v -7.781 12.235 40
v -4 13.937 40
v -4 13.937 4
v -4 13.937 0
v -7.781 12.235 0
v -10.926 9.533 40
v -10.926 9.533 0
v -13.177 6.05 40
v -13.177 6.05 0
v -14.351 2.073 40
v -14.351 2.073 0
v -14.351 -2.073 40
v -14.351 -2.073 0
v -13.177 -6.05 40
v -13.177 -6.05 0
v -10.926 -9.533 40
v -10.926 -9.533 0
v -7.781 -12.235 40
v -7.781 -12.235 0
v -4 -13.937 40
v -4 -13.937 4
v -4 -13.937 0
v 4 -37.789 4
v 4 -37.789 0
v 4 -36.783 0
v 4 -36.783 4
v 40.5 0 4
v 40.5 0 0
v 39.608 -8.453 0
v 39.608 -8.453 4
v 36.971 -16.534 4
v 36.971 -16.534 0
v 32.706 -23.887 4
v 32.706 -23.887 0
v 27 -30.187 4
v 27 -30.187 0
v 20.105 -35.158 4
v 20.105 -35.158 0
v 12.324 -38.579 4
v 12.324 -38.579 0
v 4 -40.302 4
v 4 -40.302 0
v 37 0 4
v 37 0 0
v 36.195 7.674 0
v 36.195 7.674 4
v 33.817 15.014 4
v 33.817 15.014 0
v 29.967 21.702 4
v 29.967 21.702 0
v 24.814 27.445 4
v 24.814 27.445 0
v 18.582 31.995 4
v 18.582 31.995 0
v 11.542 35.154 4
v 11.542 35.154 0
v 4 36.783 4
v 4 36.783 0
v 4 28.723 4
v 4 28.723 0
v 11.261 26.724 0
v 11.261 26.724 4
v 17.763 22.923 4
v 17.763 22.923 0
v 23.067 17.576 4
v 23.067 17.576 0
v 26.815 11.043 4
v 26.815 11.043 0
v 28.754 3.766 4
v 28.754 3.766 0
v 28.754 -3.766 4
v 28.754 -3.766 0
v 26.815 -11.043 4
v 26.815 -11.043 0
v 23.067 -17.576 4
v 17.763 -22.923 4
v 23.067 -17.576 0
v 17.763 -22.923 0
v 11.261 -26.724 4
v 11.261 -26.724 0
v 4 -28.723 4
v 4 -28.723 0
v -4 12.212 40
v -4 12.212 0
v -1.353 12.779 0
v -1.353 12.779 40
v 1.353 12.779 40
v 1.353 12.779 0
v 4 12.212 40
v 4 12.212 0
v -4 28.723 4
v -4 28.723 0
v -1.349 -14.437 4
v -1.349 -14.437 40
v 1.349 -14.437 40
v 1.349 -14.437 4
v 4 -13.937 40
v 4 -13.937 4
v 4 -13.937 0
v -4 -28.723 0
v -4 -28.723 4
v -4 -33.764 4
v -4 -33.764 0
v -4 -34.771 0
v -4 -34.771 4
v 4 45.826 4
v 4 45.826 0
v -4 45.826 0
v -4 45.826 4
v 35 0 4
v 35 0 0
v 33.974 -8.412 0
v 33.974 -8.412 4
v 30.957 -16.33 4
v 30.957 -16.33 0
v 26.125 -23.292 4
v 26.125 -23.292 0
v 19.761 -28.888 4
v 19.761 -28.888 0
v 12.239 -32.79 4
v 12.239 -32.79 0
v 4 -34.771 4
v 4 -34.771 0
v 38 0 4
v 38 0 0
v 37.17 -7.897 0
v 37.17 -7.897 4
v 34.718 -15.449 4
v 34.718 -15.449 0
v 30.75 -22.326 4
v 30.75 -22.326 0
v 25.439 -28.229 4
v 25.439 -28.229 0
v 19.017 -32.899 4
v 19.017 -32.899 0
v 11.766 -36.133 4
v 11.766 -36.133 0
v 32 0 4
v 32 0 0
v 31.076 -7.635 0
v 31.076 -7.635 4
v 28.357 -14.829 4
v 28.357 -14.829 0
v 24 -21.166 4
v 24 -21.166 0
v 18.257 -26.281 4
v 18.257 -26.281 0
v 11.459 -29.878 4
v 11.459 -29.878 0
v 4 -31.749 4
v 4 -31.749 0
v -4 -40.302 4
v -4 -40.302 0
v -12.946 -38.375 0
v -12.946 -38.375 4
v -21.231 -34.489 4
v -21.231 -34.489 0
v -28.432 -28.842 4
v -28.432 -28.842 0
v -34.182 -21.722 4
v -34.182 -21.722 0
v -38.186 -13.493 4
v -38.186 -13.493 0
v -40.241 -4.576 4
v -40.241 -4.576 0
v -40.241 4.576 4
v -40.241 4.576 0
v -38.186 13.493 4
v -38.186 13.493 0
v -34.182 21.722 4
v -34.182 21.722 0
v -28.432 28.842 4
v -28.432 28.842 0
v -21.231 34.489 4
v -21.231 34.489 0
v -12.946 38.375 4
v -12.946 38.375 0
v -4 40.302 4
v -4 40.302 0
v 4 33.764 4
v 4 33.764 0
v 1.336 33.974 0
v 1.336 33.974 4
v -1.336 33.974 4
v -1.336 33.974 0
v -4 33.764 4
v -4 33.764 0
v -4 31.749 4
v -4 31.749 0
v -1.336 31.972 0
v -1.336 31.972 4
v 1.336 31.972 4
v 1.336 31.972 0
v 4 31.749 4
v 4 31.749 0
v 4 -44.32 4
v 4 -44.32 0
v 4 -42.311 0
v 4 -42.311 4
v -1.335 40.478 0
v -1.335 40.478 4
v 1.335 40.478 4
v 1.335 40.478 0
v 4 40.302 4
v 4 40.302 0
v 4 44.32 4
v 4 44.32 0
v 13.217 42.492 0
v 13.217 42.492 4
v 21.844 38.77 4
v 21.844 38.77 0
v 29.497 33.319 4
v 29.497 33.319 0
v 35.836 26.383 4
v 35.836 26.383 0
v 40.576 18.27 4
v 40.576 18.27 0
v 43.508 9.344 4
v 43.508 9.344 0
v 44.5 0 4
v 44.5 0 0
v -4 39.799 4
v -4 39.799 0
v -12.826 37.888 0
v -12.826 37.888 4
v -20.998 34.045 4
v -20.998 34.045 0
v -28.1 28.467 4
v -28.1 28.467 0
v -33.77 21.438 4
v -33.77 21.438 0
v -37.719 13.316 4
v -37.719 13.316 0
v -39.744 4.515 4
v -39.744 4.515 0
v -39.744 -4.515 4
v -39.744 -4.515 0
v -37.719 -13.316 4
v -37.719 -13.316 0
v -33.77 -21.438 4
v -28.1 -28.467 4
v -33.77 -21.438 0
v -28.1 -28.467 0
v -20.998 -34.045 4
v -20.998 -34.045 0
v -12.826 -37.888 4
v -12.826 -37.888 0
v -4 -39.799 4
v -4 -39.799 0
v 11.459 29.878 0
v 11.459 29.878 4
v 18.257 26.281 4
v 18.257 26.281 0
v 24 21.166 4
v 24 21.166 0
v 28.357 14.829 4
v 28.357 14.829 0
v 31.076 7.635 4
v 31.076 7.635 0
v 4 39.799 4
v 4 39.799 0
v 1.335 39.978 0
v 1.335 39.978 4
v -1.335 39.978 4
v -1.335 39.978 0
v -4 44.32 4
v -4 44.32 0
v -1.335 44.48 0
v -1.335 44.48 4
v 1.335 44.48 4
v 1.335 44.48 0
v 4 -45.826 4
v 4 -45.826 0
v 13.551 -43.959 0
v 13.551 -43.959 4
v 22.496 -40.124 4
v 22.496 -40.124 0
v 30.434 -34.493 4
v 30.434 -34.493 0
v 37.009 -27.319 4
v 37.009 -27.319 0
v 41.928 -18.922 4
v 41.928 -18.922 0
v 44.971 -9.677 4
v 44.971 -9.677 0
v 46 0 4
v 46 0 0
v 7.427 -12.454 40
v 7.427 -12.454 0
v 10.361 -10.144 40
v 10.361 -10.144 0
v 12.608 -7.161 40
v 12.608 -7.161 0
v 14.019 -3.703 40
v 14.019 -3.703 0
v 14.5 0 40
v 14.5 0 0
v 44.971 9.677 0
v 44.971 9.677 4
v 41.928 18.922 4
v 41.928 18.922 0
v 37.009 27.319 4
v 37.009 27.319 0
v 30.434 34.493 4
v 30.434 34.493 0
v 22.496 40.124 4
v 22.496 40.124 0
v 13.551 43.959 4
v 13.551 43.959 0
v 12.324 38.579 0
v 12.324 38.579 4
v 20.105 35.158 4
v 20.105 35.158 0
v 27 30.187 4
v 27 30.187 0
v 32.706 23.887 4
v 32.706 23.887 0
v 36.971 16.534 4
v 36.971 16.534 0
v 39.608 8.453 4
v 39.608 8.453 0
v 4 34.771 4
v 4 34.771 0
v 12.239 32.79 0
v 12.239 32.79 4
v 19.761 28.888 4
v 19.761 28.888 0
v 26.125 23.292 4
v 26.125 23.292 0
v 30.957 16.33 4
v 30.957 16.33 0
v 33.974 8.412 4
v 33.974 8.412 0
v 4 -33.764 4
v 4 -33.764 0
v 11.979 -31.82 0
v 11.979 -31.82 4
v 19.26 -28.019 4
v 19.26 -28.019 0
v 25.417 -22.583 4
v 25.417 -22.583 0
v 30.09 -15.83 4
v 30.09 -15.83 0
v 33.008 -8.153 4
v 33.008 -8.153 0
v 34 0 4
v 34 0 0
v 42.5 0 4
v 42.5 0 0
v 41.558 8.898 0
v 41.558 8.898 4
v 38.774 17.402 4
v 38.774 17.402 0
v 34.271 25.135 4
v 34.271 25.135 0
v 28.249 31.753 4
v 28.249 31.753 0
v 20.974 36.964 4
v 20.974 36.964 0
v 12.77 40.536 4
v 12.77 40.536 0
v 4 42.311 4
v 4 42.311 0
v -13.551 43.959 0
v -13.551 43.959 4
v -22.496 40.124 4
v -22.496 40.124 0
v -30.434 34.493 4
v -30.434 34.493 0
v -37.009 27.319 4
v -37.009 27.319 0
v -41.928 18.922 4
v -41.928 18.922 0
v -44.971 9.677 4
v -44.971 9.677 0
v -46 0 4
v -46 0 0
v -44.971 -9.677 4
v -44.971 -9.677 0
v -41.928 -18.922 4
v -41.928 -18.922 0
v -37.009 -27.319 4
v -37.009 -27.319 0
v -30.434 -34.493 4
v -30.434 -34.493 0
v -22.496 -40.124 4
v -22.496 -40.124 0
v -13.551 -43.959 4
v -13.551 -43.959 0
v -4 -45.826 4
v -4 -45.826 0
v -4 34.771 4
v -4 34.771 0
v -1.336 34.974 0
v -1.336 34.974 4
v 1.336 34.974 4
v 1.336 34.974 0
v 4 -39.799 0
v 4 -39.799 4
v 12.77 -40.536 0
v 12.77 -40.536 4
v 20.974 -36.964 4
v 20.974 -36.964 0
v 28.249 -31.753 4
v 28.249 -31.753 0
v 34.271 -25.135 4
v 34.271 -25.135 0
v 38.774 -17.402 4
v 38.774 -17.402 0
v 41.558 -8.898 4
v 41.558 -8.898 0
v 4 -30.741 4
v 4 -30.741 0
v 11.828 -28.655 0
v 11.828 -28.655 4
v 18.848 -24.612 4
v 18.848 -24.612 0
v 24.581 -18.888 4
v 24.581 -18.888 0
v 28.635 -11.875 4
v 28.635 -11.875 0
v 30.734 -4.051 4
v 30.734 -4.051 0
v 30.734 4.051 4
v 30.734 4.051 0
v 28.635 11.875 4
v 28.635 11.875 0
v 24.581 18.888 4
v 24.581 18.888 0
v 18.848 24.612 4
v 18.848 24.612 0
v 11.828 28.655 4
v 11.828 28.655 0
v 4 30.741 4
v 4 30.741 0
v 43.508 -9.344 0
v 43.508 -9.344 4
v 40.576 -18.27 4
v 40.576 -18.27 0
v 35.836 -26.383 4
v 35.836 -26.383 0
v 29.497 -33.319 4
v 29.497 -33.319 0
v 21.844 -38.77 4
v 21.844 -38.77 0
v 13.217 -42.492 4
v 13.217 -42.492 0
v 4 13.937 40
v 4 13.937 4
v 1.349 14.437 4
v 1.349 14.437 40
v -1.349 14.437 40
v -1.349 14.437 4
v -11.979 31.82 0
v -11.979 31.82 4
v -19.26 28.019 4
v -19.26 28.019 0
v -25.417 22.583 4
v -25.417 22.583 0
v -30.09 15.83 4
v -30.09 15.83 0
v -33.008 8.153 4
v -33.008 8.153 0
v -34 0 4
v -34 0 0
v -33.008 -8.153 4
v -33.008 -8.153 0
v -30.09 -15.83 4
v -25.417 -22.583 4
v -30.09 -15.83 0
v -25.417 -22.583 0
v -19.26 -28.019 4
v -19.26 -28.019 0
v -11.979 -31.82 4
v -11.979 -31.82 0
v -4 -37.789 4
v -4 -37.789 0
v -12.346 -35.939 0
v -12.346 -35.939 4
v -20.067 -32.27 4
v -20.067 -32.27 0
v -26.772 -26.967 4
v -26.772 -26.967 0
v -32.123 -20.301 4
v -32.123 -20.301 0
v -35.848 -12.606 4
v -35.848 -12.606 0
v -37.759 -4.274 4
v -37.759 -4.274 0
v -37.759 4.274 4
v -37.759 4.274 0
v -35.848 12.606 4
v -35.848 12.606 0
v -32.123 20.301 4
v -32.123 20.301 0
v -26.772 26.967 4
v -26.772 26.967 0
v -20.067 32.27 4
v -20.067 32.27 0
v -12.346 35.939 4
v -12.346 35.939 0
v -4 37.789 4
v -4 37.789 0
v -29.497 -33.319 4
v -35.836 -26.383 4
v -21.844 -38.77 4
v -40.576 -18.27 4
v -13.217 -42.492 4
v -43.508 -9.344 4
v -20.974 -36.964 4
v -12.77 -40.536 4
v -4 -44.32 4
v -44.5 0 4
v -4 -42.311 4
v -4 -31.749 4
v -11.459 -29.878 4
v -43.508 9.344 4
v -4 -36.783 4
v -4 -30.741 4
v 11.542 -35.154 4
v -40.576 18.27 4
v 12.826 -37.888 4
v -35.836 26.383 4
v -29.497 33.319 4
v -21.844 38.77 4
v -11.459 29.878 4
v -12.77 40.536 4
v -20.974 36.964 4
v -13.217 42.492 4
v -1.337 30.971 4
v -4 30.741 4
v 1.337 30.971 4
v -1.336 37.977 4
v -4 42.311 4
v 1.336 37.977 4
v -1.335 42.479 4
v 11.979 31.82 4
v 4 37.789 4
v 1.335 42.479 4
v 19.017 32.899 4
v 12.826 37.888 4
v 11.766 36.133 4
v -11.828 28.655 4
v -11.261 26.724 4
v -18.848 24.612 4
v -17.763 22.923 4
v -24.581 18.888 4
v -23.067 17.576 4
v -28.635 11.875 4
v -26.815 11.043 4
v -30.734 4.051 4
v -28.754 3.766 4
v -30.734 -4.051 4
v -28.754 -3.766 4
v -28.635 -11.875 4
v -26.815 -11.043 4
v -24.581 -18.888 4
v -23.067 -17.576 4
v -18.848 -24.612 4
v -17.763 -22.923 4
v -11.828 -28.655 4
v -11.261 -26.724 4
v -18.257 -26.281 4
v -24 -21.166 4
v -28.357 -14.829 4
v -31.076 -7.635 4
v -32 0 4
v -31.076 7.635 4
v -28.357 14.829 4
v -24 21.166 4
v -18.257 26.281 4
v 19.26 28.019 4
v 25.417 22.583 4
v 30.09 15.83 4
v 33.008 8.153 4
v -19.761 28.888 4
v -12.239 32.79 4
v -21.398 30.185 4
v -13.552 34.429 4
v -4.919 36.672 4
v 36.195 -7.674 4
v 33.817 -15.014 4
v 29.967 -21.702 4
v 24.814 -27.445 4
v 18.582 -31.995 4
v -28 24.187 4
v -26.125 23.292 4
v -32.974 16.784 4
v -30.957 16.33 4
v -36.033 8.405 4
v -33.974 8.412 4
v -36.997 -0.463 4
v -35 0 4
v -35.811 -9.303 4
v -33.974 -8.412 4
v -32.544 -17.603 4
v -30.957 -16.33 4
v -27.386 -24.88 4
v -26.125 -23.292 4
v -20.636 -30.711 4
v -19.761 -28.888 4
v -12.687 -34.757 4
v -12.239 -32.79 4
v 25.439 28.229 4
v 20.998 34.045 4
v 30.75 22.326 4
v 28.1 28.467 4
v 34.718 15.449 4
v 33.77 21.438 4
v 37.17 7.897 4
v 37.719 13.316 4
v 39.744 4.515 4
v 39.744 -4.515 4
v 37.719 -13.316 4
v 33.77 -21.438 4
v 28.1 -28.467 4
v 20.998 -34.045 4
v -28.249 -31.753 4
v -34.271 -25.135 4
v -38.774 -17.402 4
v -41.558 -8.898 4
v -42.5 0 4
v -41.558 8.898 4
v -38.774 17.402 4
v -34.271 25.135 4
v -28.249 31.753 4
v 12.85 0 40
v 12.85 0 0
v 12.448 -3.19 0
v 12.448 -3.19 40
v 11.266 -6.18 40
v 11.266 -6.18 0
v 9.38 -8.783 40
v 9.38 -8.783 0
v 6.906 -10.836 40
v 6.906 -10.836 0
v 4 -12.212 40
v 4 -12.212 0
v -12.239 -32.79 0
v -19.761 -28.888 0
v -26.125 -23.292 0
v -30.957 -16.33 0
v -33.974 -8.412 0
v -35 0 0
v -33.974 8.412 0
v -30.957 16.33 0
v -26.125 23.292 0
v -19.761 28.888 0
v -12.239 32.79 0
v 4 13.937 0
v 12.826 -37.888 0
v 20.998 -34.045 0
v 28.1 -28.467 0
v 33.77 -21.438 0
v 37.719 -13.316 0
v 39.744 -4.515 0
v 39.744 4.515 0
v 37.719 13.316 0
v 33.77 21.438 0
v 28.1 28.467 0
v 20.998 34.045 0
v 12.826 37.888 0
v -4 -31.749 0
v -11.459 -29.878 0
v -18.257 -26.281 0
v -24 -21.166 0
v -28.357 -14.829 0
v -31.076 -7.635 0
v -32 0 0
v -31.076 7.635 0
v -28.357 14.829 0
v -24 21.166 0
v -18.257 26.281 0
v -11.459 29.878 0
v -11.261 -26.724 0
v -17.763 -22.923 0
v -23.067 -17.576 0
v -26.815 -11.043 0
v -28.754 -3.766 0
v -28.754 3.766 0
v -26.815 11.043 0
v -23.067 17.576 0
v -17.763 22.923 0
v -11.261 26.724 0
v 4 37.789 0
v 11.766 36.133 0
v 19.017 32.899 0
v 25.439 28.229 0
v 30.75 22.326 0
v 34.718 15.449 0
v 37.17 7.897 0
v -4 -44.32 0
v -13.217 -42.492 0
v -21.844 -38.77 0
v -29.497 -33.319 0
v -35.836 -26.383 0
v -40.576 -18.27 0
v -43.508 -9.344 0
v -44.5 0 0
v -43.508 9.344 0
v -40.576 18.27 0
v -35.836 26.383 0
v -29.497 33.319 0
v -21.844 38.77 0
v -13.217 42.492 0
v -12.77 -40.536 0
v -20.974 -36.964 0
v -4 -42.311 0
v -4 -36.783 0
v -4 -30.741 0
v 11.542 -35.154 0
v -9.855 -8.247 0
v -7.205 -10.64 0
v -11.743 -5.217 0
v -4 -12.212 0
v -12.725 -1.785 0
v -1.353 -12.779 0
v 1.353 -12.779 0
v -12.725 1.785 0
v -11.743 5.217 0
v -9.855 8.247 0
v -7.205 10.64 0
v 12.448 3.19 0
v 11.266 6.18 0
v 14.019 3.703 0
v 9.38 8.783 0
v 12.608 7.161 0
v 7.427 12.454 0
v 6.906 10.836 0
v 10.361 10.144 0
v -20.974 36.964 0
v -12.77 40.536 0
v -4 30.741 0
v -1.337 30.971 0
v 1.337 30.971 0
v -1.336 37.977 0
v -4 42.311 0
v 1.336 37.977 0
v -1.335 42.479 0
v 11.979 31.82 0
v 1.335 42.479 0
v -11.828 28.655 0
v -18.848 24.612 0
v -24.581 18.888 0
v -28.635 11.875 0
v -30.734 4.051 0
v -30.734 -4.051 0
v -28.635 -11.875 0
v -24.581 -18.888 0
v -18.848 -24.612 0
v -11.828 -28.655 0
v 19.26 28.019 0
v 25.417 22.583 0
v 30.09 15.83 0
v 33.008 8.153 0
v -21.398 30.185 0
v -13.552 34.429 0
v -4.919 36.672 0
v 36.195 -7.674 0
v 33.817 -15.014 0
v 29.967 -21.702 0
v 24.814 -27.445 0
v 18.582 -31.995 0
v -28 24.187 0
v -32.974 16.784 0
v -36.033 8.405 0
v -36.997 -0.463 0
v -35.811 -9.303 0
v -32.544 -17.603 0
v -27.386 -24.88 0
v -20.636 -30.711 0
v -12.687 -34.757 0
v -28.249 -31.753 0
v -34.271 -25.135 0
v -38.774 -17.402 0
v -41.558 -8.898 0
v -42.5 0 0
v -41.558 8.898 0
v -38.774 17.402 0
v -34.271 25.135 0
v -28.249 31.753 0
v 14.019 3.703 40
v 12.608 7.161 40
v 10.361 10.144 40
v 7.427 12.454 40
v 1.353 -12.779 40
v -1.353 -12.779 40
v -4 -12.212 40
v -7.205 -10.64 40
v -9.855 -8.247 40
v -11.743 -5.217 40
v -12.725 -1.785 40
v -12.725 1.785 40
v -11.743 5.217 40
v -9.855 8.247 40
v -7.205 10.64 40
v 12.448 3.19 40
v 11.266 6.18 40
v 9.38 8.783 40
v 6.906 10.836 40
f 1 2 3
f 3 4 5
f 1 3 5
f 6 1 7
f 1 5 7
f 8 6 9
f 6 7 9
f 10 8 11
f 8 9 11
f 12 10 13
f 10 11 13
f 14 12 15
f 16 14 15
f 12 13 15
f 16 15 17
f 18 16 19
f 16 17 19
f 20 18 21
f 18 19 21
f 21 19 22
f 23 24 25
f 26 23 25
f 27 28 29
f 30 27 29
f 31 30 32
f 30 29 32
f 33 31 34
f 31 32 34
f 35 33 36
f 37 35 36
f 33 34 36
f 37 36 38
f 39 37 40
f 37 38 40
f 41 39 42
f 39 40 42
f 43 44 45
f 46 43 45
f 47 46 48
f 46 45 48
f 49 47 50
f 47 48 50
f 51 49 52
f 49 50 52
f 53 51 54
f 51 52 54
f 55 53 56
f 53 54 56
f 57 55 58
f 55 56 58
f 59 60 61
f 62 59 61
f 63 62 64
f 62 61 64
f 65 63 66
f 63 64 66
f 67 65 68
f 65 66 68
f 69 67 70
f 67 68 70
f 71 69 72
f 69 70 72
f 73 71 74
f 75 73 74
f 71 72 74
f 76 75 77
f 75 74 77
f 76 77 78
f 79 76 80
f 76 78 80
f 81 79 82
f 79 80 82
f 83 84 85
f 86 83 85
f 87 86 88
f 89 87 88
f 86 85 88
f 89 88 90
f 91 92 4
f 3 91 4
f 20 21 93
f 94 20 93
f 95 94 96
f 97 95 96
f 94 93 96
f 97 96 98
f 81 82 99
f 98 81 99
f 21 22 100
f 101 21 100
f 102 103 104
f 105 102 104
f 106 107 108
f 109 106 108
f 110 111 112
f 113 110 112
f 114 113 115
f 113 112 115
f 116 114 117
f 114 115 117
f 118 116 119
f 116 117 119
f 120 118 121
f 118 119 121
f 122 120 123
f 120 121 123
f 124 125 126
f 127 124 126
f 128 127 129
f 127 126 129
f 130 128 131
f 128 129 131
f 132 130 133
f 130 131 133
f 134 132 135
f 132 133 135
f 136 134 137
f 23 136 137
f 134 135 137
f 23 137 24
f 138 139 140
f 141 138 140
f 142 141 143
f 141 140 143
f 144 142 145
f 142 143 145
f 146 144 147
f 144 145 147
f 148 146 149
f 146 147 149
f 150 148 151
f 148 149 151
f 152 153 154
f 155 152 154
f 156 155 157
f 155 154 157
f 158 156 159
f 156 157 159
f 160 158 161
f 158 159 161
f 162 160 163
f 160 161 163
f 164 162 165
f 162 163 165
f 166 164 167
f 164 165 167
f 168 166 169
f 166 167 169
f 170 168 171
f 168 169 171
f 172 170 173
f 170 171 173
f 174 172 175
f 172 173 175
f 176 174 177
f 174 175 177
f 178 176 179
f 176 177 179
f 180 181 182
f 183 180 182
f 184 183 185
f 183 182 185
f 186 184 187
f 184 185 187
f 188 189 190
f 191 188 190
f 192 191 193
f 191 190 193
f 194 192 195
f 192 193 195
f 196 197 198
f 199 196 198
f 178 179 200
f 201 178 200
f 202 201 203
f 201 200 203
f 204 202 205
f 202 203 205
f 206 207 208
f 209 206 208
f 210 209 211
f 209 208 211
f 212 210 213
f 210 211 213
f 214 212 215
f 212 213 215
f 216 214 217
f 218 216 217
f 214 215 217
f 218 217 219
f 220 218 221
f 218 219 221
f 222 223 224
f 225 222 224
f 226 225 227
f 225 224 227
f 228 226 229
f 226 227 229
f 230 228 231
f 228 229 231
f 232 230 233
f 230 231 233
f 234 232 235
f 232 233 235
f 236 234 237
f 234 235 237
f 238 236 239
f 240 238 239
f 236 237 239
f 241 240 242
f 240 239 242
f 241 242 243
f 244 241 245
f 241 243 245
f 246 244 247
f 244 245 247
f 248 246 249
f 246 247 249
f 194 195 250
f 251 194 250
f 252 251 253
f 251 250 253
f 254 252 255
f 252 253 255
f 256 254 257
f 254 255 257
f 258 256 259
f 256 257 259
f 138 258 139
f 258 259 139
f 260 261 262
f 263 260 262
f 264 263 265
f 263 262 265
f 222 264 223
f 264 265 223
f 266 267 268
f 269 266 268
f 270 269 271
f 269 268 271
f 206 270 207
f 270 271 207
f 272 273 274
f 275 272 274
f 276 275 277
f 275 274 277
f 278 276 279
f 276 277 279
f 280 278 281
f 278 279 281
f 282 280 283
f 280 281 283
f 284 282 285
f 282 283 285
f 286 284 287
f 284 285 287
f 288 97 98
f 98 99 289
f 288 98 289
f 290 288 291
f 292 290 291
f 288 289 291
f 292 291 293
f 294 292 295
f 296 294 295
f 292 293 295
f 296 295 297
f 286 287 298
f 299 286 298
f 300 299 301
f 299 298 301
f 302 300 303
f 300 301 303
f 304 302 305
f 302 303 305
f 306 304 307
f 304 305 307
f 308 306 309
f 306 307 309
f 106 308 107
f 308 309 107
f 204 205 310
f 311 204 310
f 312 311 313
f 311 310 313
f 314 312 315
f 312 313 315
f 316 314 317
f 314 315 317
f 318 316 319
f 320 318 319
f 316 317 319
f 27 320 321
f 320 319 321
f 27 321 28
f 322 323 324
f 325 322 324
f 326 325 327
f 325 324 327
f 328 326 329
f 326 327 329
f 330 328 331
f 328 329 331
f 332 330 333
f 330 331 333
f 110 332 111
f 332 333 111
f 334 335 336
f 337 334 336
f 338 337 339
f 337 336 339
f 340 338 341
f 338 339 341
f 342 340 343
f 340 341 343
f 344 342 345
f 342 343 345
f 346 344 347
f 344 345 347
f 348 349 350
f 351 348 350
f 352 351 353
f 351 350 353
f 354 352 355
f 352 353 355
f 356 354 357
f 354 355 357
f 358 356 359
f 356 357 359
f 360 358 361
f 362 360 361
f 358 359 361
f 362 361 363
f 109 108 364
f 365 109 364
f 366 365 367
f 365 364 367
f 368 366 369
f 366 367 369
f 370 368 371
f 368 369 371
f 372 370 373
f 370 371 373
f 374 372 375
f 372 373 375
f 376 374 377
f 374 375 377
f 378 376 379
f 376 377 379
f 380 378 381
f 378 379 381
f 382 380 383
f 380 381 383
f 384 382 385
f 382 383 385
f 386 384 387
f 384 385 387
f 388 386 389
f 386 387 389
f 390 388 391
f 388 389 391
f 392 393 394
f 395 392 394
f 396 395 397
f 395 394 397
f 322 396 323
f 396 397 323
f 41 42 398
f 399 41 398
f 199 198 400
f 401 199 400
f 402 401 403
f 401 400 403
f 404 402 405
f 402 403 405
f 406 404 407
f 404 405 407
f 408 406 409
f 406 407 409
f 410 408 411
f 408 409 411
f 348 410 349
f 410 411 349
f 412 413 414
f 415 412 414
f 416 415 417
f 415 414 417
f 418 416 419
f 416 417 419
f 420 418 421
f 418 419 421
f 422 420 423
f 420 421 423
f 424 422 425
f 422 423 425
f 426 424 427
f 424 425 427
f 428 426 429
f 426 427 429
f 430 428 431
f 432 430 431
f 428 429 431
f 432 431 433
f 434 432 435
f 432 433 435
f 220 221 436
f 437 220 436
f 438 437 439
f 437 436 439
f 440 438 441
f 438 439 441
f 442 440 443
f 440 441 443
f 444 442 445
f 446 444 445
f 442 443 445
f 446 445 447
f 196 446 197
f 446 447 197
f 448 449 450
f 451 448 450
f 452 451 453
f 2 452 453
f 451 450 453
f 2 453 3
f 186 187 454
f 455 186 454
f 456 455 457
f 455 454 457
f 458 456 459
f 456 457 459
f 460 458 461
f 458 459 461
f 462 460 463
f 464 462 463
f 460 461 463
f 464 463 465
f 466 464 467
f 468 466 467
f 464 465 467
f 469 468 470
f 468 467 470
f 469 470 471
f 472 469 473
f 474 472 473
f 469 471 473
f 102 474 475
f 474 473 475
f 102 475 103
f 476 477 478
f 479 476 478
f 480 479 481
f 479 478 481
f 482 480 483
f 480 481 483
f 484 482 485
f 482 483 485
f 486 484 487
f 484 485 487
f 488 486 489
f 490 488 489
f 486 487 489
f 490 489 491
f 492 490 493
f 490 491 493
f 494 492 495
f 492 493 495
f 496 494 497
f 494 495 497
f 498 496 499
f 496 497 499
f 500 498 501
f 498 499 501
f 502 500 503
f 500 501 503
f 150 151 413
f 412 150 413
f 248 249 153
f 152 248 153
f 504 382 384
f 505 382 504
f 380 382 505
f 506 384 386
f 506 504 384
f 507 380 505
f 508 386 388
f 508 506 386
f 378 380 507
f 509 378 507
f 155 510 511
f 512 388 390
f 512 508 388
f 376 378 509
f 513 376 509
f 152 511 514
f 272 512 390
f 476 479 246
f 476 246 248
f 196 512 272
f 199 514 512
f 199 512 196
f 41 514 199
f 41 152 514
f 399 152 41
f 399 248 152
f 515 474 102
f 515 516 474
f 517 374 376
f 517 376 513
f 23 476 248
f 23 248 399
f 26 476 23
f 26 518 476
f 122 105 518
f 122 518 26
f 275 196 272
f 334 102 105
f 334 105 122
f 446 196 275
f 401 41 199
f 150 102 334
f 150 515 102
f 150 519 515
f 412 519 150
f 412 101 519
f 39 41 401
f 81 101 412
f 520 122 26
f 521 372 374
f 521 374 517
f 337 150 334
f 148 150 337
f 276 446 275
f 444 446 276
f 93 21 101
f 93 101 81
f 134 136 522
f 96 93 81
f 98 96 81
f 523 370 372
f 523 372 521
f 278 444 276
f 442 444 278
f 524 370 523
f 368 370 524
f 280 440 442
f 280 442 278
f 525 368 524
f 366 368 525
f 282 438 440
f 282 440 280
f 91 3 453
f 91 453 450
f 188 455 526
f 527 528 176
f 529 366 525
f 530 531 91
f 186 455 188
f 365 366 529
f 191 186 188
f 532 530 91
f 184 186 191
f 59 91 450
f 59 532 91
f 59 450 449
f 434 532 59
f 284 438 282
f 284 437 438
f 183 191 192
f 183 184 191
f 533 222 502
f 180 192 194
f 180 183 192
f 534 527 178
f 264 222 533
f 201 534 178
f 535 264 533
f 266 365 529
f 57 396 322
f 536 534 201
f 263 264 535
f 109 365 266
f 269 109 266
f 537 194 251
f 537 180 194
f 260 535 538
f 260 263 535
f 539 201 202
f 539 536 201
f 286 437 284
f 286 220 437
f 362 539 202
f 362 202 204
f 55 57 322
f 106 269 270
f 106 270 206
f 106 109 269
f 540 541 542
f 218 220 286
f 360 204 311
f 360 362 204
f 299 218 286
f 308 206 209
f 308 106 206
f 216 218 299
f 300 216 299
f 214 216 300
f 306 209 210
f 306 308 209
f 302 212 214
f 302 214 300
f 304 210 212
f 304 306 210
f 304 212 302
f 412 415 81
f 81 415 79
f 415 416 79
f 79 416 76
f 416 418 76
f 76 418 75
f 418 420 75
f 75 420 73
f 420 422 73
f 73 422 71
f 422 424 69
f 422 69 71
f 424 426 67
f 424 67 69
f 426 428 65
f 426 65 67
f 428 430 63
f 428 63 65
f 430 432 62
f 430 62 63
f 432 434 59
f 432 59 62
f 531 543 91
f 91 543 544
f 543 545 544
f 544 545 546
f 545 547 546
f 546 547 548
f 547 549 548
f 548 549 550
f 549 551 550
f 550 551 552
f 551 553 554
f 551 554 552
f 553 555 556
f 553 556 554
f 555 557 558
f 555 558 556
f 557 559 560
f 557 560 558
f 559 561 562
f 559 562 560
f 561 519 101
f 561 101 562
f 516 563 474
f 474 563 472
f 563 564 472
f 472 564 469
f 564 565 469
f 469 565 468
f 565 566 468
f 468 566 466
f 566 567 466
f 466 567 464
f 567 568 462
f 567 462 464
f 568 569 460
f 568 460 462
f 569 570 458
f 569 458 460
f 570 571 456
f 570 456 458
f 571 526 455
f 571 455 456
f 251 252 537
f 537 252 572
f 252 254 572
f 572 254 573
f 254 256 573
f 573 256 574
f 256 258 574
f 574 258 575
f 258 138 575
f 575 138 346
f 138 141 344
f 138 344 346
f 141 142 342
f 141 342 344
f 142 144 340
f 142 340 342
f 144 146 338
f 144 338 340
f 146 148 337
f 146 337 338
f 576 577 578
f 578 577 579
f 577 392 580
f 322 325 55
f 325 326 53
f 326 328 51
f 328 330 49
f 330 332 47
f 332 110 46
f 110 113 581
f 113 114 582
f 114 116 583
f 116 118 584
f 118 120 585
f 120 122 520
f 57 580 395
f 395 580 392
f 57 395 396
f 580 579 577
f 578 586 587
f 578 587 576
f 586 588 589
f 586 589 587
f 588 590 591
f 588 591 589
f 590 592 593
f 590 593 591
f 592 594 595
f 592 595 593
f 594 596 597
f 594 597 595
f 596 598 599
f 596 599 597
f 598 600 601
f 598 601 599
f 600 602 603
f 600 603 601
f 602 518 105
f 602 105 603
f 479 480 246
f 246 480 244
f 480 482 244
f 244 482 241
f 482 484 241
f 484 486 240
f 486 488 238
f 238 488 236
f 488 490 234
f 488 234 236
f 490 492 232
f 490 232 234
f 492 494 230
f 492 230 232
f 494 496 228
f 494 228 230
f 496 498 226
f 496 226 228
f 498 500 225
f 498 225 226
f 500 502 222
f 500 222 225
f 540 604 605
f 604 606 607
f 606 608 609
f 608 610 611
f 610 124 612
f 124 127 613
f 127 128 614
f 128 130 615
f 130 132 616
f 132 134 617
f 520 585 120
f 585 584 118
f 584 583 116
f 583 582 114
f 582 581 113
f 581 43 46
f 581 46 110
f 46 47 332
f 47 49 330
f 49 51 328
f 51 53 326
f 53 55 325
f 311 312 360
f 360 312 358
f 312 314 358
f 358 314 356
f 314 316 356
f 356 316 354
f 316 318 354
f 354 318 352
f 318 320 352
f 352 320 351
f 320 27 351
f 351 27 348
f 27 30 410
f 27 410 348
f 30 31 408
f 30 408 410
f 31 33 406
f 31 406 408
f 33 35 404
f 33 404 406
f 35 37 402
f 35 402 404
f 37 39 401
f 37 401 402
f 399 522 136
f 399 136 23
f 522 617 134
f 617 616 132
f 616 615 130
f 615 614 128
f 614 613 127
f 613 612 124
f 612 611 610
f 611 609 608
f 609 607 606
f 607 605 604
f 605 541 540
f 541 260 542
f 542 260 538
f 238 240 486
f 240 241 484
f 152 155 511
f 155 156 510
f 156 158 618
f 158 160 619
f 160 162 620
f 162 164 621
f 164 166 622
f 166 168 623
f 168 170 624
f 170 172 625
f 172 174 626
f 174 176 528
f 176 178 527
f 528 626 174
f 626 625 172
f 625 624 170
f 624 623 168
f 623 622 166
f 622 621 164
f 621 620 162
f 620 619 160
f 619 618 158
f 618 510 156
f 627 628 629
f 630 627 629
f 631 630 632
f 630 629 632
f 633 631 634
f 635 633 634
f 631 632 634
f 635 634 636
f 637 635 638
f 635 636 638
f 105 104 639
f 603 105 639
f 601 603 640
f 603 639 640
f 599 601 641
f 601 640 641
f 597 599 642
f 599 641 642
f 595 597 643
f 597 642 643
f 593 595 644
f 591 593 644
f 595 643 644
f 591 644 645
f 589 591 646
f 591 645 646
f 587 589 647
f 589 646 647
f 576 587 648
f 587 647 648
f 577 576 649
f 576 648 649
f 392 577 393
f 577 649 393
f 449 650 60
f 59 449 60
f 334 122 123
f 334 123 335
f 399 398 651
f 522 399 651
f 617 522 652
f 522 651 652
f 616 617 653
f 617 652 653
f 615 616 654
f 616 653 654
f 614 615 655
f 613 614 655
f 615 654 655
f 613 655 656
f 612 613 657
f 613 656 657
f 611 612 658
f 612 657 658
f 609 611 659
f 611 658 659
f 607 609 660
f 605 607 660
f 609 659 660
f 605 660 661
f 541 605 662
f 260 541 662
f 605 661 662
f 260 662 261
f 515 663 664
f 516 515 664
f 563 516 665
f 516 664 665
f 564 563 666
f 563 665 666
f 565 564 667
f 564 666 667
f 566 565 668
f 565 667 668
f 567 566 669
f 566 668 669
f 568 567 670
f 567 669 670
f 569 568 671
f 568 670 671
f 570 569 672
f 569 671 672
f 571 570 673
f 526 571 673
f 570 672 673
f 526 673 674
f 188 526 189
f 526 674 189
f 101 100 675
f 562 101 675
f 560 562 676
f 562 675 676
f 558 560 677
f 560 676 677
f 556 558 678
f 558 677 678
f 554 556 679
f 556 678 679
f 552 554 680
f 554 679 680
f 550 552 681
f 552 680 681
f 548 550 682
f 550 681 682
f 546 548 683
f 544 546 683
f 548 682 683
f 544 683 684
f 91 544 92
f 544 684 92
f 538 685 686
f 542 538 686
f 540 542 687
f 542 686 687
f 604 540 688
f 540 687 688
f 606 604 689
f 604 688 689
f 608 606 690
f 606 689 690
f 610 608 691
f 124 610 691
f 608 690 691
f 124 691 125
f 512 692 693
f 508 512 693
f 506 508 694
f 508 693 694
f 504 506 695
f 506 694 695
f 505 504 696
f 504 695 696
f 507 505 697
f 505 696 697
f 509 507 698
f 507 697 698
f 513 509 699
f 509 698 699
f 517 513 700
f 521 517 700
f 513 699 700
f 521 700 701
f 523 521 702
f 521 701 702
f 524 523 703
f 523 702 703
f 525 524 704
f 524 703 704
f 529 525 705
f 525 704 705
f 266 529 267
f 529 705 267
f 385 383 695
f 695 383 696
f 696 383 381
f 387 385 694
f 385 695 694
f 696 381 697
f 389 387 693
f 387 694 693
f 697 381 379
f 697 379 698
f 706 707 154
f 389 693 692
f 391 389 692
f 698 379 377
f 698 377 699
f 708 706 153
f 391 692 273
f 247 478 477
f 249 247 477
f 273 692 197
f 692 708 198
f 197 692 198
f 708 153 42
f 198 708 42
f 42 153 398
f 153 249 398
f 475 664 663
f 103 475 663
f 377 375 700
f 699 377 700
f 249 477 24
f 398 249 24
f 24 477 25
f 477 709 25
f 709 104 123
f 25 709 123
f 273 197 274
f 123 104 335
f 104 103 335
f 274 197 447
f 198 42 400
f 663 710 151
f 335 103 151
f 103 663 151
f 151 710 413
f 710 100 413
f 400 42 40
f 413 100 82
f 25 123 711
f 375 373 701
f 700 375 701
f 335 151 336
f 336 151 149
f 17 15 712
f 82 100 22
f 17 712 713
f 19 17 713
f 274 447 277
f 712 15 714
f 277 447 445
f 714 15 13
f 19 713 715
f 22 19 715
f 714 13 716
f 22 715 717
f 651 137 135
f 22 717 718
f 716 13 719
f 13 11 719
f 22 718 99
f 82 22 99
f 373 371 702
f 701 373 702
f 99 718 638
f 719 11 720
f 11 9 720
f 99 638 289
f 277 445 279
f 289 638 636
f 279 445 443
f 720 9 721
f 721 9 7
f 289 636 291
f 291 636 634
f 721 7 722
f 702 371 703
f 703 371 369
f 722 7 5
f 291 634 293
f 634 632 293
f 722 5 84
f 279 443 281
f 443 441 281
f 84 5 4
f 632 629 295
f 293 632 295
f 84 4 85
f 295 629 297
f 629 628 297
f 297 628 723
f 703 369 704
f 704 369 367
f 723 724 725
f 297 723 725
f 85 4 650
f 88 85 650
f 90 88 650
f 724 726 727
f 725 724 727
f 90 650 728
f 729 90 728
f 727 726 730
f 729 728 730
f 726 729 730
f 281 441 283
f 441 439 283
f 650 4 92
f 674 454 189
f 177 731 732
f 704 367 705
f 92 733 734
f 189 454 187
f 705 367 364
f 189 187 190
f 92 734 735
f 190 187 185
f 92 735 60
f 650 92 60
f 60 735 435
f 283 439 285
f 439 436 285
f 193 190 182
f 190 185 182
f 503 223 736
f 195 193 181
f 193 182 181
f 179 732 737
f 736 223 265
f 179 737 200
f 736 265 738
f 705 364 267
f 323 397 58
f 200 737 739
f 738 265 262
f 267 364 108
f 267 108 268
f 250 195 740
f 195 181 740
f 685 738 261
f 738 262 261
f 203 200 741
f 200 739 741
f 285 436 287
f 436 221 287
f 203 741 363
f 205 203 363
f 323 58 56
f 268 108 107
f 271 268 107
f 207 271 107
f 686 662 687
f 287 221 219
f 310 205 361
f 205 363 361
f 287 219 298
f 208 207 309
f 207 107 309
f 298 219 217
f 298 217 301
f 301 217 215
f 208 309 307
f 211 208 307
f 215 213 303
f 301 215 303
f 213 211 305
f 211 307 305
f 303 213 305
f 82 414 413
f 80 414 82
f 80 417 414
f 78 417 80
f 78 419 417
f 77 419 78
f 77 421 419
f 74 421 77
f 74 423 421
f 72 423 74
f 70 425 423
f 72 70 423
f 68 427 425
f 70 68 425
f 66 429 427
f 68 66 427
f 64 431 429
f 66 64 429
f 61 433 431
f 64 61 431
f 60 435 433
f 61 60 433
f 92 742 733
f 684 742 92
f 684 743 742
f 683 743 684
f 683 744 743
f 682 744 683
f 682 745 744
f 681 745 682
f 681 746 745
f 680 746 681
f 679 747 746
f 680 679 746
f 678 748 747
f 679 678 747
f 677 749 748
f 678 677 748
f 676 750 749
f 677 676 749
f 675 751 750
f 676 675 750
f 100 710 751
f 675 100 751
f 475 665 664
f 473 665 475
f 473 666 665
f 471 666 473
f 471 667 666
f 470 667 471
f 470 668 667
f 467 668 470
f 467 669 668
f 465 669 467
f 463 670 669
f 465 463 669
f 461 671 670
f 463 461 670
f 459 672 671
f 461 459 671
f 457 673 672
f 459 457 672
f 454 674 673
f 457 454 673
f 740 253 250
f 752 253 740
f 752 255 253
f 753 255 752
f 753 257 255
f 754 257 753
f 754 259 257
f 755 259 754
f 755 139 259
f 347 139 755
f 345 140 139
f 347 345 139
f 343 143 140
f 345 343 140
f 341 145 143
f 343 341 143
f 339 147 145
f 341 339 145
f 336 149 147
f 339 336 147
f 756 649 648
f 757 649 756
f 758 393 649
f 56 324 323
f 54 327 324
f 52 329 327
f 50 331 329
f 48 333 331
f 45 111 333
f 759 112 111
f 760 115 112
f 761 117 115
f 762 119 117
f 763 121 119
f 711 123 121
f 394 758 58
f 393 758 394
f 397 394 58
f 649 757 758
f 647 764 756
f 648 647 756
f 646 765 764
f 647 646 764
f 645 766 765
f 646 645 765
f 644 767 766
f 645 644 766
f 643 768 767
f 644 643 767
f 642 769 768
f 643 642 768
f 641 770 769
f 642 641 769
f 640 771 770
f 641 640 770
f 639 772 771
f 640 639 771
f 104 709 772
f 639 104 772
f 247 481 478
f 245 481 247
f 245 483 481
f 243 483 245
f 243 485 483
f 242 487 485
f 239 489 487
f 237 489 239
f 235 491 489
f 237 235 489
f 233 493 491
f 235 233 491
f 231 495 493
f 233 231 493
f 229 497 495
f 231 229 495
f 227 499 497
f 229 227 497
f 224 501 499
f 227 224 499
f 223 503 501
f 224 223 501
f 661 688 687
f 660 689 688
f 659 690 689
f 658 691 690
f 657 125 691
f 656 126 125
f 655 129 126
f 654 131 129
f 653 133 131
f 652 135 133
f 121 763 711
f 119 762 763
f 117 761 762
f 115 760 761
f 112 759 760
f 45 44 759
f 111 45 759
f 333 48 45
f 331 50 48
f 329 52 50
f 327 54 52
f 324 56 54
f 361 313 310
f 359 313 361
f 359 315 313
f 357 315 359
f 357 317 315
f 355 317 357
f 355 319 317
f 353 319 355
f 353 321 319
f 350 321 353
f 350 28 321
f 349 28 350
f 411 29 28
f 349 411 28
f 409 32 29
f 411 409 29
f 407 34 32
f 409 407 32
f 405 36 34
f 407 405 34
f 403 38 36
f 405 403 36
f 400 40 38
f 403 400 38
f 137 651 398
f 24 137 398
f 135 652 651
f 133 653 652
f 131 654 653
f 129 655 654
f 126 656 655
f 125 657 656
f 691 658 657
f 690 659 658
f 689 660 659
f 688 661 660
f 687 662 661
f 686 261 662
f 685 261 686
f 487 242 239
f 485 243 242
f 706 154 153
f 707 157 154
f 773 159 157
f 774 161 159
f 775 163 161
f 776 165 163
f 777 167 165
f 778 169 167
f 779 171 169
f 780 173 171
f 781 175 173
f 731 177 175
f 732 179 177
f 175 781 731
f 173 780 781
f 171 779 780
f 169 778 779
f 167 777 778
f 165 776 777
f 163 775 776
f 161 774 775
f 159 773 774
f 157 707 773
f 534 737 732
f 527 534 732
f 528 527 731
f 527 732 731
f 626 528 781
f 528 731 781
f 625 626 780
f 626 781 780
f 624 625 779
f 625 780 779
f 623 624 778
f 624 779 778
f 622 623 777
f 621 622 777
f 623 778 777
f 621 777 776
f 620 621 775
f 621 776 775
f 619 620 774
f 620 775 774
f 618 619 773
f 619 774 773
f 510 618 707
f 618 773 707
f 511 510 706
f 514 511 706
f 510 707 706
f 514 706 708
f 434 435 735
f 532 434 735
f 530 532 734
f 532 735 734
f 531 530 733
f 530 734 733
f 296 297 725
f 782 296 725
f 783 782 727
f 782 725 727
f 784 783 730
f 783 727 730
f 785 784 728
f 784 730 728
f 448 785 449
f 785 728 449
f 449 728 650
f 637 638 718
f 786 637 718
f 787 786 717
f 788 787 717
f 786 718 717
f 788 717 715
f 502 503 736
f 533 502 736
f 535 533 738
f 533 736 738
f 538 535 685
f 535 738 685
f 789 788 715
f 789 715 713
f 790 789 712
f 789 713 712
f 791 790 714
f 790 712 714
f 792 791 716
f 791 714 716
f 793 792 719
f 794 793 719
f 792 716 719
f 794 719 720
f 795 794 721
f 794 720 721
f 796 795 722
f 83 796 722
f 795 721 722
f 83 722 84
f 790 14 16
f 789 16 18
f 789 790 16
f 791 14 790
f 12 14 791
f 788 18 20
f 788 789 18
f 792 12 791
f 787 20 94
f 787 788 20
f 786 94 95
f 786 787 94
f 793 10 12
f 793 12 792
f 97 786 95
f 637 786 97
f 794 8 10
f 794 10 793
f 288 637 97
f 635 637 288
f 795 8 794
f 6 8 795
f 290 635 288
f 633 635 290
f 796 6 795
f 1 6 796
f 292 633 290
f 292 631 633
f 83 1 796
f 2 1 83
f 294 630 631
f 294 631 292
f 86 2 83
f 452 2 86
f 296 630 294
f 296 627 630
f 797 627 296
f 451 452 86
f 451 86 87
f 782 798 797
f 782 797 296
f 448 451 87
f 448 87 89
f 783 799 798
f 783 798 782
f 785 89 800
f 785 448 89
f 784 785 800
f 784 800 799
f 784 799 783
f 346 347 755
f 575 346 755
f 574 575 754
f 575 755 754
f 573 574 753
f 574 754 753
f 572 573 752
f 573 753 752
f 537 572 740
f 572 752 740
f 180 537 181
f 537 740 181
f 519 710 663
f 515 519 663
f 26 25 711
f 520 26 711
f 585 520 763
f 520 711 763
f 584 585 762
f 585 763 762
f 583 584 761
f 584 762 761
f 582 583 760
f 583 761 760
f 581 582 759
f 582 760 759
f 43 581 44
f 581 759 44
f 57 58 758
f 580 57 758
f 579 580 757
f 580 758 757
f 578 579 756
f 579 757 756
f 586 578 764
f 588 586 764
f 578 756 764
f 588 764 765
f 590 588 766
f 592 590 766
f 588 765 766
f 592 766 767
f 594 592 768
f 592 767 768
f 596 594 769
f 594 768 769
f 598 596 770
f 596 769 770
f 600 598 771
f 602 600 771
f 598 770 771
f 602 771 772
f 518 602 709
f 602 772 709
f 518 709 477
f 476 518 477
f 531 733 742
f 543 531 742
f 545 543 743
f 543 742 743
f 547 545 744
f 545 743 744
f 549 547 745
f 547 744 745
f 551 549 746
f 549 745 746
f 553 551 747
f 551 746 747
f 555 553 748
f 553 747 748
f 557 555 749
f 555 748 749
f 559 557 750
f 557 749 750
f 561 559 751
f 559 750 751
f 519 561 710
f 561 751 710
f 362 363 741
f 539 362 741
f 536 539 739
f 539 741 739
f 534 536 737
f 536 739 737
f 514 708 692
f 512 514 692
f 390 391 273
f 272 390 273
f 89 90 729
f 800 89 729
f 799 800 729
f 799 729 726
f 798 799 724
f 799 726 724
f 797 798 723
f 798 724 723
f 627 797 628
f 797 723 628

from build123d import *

# Parameters (mm, degrees)
F1_DEPTH = 40
F2_DEPTH = 4


with BuildPart() as f1:
    # F0 (on Top) → F1 (new body)
    with BuildSketch(Plane.XY):
        with BuildLine():
            ThreePointArc((4, 12.2115723803), (10.4048666498, 7.5406398933), (12.85, 0))
            ThreePointArc((12.85, 0), (10.4048666498, -7.5406398933), (4, -12.2115723803))
            Line((4, -12.2115723803), (4, -13.9373598648))
            ThreePointArc((4, -13.9373598648), (11.5812348219, -8.7249641833), (14.5, 0))
            ThreePointArc((14.5, 0), (11.5812348219, 8.7249641833), (4, 13.9373598648))
            Line((4, 13.9373598648), (4, 12.2115723803))
        make_face()
        with BuildLine():
            ThreePointArc((-4, 12.2115723803), (0, 12.85), (4, 12.2115723803))
            Line((4, 12.2115723803), (4, 13.9373598648))
            ThreePointArc((4, 13.9373598648), (0, 14.5), (-4, 13.9373598648))
            Line((-4, 13.9373598648), (-4, 12.2115723803))
        make_face()
        with BuildLine():
            Line((4, -13.9373598648), (4, -12.2115723803))
            ThreePointArc((4, -12.2115723803), (0, -12.85), (-4, -12.2115723803))
            Line((-4, -12.2115723803), (-4, -13.9373598648))
            ThreePointArc((-4, -13.9373598648), (0, -14.5), (4, -13.9373598648))
        make_face()
        with BuildLine():
            ThreePointArc((-4, -12.2115723803), (-12.85, 0), (-4, 12.2115723803))
            Line((-4, 12.2115723803), (-4, 13.9373598648))
            ThreePointArc((-4, 13.9373598648), (-14.5, 0), (-4, -13.9373598648))
            Line((-4, -13.9373598648), (-4, -12.2115723803))
        make_face()
    extrude(amount=F1_DEPTH)

    # F0 (on Top) → F2 (join)
    with BuildSketch(Plane.XY):
        with BuildLine():
            Line((4, -28.7228132327), (4, -13.9373598648))
            ThreePointArc((4, -13.9373598648), (0, -14.5), (-4, -13.9373598648))
            Line((-4, -13.9373598648), (-4, -28.7228132327))
            ThreePointArc((-4, -28.7228132327), (0, -29), (4, -28.7228132327))
        make_face()
        with BuildLine():
            ThreePointArc((-4, 40.3019850628), (0, 40.5), (4, 40.3019850628))
            Line((4, 40.3019850628), (4, 42.3113459961))
            ThreePointArc((4, 42.3113459961), (0, 42.5), (-4, 42.3113459961))
            Line((-4, 42.3113459961), (-4, 40.3019850628))
        make_face()
        with BuildLine():
            ThreePointArc((-4, -40.3019850628), (-40.5, 0), (-4, 40.3019850628))
            Line((-4, 40.3019850628), (-4, 42.3113459961))
            ThreePointArc((-4, 42.3113459961), (-42.5, 0), (-4, -42.3113459961))
            Line((-4, -42.3113459961), (-4, -40.3019850628))
        make_face()
        with BuildLine():
            Line((4, -42.3113459961), (4, -40.3019850628))
            ThreePointArc((4, -40.3019850628), (0, -40.5), (-4, -40.3019850628))
            Line((-4, -40.3019850628), (-4, -42.3113459961))
            ThreePointArc((-4, -42.3113459961), (0, -42.5), (4, -42.3113459961))
        make_face()
        with BuildLine():
            Line((4, 42.3113459961), (4, 40.3019850628))
            ThreePointArc((4, 40.3019850628), (30.0187441443, 27.1868534406), (40.5, 0))
            ThreePointArc((40.5, 0), (30.0187441443, -27.1868534406), (4, -40.3019850628))
            Line((4, -40.3019850628), (4, -42.3113459961))
            ThreePointArc((4, -42.3113459961), (31.434455618, -28.6028844699), (42.5, 0))
            ThreePointArc((42.5, 0), (31.434455618, 28.6028844699), (4, 42.3113459961))
        make_face()
        with BuildLine():
            ThreePointArc((-4, 37.7888872554), (0, 38), (4, 37.7888872554))
            Line((4, 37.7888872554), (4, 39.7994974843))
            ThreePointArc((4, 39.7994974843), (0, 40), (-4, 39.7994974843))
            Line((-4, 39.7994974843), (-4, 37.7888872554))
        make_face()
        with BuildLine():
            ThreePointArc((-4, -37.7888872554), (-38, 0), (-4, 37.7888872554))
            Line((-4, 37.7888872554), (-4, 39.7994974843))
            ThreePointArc((-4, 39.7994974843), (-40, 0), (-4, -39.7994974843))
            Line((-4, -39.7994974843), (-4, -37.7888872554))
        make_face()
        with BuildLine():
            Line((4, -39.7994974843), (4, -37.7888872554))
            ThreePointArc((4, -37.7888872554), (0, -38), (-4, -37.7888872554))
            Line((-4, -37.7888872554), (-4, -39.7994974843))
            ThreePointArc((-4, -39.7994974843), (0, -40), (4, -39.7994974843))
        make_face()
        with BuildLine():
            Line((4, 39.7994974843), (4, 37.7888872554))
            ThreePointArc((4, 37.7888872554), (28.2488937837, 25.4165300543), (38, 0))
            ThreePointArc((38, 0), (28.2488937837, -25.4165300543), (4, -37.7888872554))
            Line((4, -37.7888872554), (4, -39.7994974843))
            ThreePointArc((4, -39.7994974843), (29.6647939484, -26.83281573), (40, 0))
            ThreePointArc((40, 0), (29.6647939484, 26.83281573), (4, 39.7994974843))
        make_face()
        with BuildLine():
            Line((4, -40.3019850628), (4, -39.7994974843))
            ThreePointArc((4, -39.7994974843), (0, -40), (-4, -39.7994974843))
            Line((-4, -39.7994974843), (-4, -40.3019850628))
            ThreePointArc((-4, -40.3019850628), (0, -40.5), (4, -40.3019850628))
        make_face()
        with BuildLine():
            Line((4, -44.3198601081), (4, -42.3113459961))
            ThreePointArc((4, -42.3113459961), (0, -42.5), (-4, -42.3113459961))
            Line((-4, -42.3113459961), (-4, -44.3198601081))
            ThreePointArc((-4, -44.3198601081), (0, -44.5), (4, -44.3198601081))
        make_face()
        with BuildLine():
            ThreePointArc((-4, -44.3198601081), (-44.5, 0), (-4, 44.3198601081))
            Line((-4, 44.3198601081), (-4, 45.8257569496))
            ThreePointArc((-4, 45.8257569496), (-46, 0), (-4, -45.8257569496))
            Line((-4, -45.8257569496), (-4, -44.3198601081))
        make_face()
        with BuildLine():
            Line((4, 45.8257569496), (4, 44.3198601081))
            ThreePointArc((4, 44.3198601081), (32.8500380517, 30.0187441443), (44.5, 0))
            ThreePointArc((44.5, 0), (32.8500380517, -30.0187441443), (4, -44.3198601081))
            Line((4, -44.3198601081), (4, -45.8257569496))
            ThreePointArc((4, -45.8257569496), (33.9116499156, -31.0805405358), (46, 0))
            ThreePointArc((46, 0), (33.9116499156, 31.0805405358), (4, 45.8257569496))
        make_face()
        with BuildLine():
            ThreePointArc((-4, 44.3198601081), (0, 44.5), (4, 44.3198601081))
            Line((4, 44.3198601081), (4, 45.8257569496))
            Line((4, 45.8257569496), (-4, 45.8257569496))
            Line((-4, 45.8257569496), (-4, 44.3198601081))
        make_face()
        with BuildLine():
            Line((4, -45.8257569496), (4, -44.3198601081))
            ThreePointArc((4, -44.3198601081), (0, -44.5), (-4, -44.3198601081))
            Line((-4, -44.3198601081), (-4, -45.8257569496))
            Line((-4, -45.8257569496), (4, -45.8257569496))
        make_face()
        with BuildLine():
            ThreePointArc((-4, -34.7706773014), (-35, 0), (-4, 34.7706773014))
            Line((-4, 34.7706773014), (-4, 36.7831483155))
            ThreePointArc((-4, 36.7831483155), (-37, 0), (-4, -36.7831483155))
            Line((-4, -36.7831483155), (-4, -34.7706773014))
        make_face()
        with BuildLine():
            ThreePointArc((-4, -31.7490157328), (-32, 0), (-4, 31.7490157328))
            Line((-4, 31.7490157328), (-4, 33.7638860323))
            ThreePointArc((-4, 33.7638860323), (-34, 0), (-4, -33.7638860323))
            Line((-4, -33.7638860323), (-4, -31.7490157328))
        make_face()
        with BuildLine():
            ThreePointArc((-4, -28.7228132327), (-29, 0), (-4, 28.7228132327))
            Line((-4, 28.7228132327), (-4, 30.7408522979))
            ThreePointArc((-4, 30.7408522979), (-31, 0), (-4, -30.7408522979))
            Line((-4, -30.7408522979), (-4, -28.7228132327))
        make_face()
        with BuildLine():
            Line((4, 36.7831483155), (4, 34.7706773014))
            ThreePointArc((4, 34.7706773014), (26.1247009552, 23.2916293977), (35, 0))
            ThreePointArc((35, 0), (26.1247009552, -23.2916293977), (4, -34.7706773014))
            Line((4, -34.7706773014), (4, -36.7831483155))
            ThreePointArc((4, -36.7831483155), (27.5408787078, -24.7082982012), (37, 0))
            ThreePointArc((37, 0), (27.5408787078, 24.7082982012), (4, 36.7831483155))
        make_face()
        with BuildLine():
            Line((4, 33.7638860323), (4, 31.7490157328))
            ThreePointArc((4, 31.7490157328), (24, 21.1660104885), (32, 0))
            ThreePointArc((32, 0), (24, -21.1660104885), (4, -31.7490157328))
            Line((4, -31.7490157328), (4, -33.7638860323))
            ThreePointArc((4, -33.7638860323), (25.4165300543, -22.5831795813), (34, 0))
            ThreePointArc((34, 0), (25.4165300543, 22.5831795813), (4, 33.7638860323))
        make_face()
        with BuildLine():
            Line((4, 30.7408522979), (4, 28.7228132327))
            ThreePointArc((4, 28.7228132327), (21.8746428542, 19.0394327647), (29, 0))
            ThreePointArc((29, 0), (21.8746428542, -19.0394327647), (4, -28.7228132327))
            Line((4, -28.7228132327), (4, -30.7408522979))
            ThreePointArc((4, -30.7408522979), (23.2916293977, -20.4572725455), (31, 0))
            ThreePointArc((31, 0), (23.2916293977, 20.4572725455), (4, 30.7408522979))
        make_face()
        with BuildLine():
            ThreePointArc((-4, 28.7228132327), (0, 29), (4, 28.7228132327))
            Line((4, 28.7228132327), (4, 30.7408522979))
            ThreePointArc((4, 30.7408522979), (0, 31), (-4, 30.7408522979))
            Line((-4, 30.7408522979), (-4, 28.7228132327))
        make_face()
        with BuildLine():
            ThreePointArc((-4, 31.7490157328), (0, 32), (4, 31.7490157328))
            Line((4, 31.7490157328), (4, 33.7638860323))
            ThreePointArc((4, 33.7638860323), (0, 34), (-4, 33.7638860323))
            Line((-4, 33.7638860323), (-4, 31.7490157328))
        make_face()
        with BuildLine():
            ThreePointArc((-4, 34.7706773014), (0, 35), (4, 34.7706773014))
            Line((4, 34.7706773014), (4, 36.7831483155))
            ThreePointArc((4, 36.7831483155), (0, 37), (-4, 36.7831483155))
            Line((-4, 36.7831483155), (-4, 34.7706773014))
        make_face()
        with BuildLine():
            Line((4, -30.7408522979), (4, -28.7228132327))
            ThreePointArc((4, -28.7228132327), (0, -29), (-4, -28.7228132327))
            Line((-4, -28.7228132327), (-4, -30.7408522979))
            ThreePointArc((-4, -30.7408522979), (0, -31), (4, -30.7408522979))
        make_face()
        with BuildLine():
            Line((4, -33.7638860323), (4, -31.7490157328))
            ThreePointArc((4, -31.7490157328), (0, -32), (-4, -31.7490157328))
            Line((-4, -31.7490157328), (-4, -33.7638860323))
            ThreePointArc((-4, -33.7638860323), (0, -34), (4, -33.7638860323))
        make_face()
        with BuildLine():
            Line((4, -36.7831483155), (4, -34.7706773014))
            ThreePointArc((4, -34.7706773014), (0, -35), (-4, -34.7706773014))
            Line((-4, -34.7706773014), (-4, -36.7831483155))
            ThreePointArc((-4, -36.7831483155), (0, -37), (4, -36.7831483155))
        make_face()
        with BuildLine():
            Line((4, -31.7490157328), (4, -30.7408522979))
            ThreePointArc((4, -30.7408522979), (0, -31), (-4, -30.7408522979))
            Line((-4, -30.7408522979), (-4, -31.7490157328))
            ThreePointArc((-4, -31.7490157328), (0, -32), (4, -31.7490157328))
        make_face()
        with BuildLine():
            Line((4, -34.7706773014), (4, -33.7638860323))
            ThreePointArc((4, -33.7638860323), (0, -34), (-4, -33.7638860323))
            Line((-4, -33.7638860323), (-4, -34.7706773014))
            ThreePointArc((-4, -34.7706773014), (0, -35), (4, -34.7706773014))
        make_face()
        with BuildLine():
            Line((4, -37.7888872554), (4, -36.7831483155))
            ThreePointArc((4, -36.7831483155), (0, -37), (-4, -36.7831483155))
            Line((-4, -36.7831483155), (-4, -37.7888872554))
            ThreePointArc((-4, -37.7888872554), (0, -38), (4, -37.7888872554))
        make_face()
        with BuildLine():
            ThreePointArc((-4, 13.9373598648), (0, 14.5), (4, 13.9373598648))
            Line((4, 13.9373598648), (4, 28.7228132327))
            ThreePointArc((4, 28.7228132327), (0, 29), (-4, 28.7228132327))
            Line((-4, 28.7228132327), (-4, 13.9373598648))
        make_face()
    extrude(amount=F2_DEPTH)


solid = f1.part
